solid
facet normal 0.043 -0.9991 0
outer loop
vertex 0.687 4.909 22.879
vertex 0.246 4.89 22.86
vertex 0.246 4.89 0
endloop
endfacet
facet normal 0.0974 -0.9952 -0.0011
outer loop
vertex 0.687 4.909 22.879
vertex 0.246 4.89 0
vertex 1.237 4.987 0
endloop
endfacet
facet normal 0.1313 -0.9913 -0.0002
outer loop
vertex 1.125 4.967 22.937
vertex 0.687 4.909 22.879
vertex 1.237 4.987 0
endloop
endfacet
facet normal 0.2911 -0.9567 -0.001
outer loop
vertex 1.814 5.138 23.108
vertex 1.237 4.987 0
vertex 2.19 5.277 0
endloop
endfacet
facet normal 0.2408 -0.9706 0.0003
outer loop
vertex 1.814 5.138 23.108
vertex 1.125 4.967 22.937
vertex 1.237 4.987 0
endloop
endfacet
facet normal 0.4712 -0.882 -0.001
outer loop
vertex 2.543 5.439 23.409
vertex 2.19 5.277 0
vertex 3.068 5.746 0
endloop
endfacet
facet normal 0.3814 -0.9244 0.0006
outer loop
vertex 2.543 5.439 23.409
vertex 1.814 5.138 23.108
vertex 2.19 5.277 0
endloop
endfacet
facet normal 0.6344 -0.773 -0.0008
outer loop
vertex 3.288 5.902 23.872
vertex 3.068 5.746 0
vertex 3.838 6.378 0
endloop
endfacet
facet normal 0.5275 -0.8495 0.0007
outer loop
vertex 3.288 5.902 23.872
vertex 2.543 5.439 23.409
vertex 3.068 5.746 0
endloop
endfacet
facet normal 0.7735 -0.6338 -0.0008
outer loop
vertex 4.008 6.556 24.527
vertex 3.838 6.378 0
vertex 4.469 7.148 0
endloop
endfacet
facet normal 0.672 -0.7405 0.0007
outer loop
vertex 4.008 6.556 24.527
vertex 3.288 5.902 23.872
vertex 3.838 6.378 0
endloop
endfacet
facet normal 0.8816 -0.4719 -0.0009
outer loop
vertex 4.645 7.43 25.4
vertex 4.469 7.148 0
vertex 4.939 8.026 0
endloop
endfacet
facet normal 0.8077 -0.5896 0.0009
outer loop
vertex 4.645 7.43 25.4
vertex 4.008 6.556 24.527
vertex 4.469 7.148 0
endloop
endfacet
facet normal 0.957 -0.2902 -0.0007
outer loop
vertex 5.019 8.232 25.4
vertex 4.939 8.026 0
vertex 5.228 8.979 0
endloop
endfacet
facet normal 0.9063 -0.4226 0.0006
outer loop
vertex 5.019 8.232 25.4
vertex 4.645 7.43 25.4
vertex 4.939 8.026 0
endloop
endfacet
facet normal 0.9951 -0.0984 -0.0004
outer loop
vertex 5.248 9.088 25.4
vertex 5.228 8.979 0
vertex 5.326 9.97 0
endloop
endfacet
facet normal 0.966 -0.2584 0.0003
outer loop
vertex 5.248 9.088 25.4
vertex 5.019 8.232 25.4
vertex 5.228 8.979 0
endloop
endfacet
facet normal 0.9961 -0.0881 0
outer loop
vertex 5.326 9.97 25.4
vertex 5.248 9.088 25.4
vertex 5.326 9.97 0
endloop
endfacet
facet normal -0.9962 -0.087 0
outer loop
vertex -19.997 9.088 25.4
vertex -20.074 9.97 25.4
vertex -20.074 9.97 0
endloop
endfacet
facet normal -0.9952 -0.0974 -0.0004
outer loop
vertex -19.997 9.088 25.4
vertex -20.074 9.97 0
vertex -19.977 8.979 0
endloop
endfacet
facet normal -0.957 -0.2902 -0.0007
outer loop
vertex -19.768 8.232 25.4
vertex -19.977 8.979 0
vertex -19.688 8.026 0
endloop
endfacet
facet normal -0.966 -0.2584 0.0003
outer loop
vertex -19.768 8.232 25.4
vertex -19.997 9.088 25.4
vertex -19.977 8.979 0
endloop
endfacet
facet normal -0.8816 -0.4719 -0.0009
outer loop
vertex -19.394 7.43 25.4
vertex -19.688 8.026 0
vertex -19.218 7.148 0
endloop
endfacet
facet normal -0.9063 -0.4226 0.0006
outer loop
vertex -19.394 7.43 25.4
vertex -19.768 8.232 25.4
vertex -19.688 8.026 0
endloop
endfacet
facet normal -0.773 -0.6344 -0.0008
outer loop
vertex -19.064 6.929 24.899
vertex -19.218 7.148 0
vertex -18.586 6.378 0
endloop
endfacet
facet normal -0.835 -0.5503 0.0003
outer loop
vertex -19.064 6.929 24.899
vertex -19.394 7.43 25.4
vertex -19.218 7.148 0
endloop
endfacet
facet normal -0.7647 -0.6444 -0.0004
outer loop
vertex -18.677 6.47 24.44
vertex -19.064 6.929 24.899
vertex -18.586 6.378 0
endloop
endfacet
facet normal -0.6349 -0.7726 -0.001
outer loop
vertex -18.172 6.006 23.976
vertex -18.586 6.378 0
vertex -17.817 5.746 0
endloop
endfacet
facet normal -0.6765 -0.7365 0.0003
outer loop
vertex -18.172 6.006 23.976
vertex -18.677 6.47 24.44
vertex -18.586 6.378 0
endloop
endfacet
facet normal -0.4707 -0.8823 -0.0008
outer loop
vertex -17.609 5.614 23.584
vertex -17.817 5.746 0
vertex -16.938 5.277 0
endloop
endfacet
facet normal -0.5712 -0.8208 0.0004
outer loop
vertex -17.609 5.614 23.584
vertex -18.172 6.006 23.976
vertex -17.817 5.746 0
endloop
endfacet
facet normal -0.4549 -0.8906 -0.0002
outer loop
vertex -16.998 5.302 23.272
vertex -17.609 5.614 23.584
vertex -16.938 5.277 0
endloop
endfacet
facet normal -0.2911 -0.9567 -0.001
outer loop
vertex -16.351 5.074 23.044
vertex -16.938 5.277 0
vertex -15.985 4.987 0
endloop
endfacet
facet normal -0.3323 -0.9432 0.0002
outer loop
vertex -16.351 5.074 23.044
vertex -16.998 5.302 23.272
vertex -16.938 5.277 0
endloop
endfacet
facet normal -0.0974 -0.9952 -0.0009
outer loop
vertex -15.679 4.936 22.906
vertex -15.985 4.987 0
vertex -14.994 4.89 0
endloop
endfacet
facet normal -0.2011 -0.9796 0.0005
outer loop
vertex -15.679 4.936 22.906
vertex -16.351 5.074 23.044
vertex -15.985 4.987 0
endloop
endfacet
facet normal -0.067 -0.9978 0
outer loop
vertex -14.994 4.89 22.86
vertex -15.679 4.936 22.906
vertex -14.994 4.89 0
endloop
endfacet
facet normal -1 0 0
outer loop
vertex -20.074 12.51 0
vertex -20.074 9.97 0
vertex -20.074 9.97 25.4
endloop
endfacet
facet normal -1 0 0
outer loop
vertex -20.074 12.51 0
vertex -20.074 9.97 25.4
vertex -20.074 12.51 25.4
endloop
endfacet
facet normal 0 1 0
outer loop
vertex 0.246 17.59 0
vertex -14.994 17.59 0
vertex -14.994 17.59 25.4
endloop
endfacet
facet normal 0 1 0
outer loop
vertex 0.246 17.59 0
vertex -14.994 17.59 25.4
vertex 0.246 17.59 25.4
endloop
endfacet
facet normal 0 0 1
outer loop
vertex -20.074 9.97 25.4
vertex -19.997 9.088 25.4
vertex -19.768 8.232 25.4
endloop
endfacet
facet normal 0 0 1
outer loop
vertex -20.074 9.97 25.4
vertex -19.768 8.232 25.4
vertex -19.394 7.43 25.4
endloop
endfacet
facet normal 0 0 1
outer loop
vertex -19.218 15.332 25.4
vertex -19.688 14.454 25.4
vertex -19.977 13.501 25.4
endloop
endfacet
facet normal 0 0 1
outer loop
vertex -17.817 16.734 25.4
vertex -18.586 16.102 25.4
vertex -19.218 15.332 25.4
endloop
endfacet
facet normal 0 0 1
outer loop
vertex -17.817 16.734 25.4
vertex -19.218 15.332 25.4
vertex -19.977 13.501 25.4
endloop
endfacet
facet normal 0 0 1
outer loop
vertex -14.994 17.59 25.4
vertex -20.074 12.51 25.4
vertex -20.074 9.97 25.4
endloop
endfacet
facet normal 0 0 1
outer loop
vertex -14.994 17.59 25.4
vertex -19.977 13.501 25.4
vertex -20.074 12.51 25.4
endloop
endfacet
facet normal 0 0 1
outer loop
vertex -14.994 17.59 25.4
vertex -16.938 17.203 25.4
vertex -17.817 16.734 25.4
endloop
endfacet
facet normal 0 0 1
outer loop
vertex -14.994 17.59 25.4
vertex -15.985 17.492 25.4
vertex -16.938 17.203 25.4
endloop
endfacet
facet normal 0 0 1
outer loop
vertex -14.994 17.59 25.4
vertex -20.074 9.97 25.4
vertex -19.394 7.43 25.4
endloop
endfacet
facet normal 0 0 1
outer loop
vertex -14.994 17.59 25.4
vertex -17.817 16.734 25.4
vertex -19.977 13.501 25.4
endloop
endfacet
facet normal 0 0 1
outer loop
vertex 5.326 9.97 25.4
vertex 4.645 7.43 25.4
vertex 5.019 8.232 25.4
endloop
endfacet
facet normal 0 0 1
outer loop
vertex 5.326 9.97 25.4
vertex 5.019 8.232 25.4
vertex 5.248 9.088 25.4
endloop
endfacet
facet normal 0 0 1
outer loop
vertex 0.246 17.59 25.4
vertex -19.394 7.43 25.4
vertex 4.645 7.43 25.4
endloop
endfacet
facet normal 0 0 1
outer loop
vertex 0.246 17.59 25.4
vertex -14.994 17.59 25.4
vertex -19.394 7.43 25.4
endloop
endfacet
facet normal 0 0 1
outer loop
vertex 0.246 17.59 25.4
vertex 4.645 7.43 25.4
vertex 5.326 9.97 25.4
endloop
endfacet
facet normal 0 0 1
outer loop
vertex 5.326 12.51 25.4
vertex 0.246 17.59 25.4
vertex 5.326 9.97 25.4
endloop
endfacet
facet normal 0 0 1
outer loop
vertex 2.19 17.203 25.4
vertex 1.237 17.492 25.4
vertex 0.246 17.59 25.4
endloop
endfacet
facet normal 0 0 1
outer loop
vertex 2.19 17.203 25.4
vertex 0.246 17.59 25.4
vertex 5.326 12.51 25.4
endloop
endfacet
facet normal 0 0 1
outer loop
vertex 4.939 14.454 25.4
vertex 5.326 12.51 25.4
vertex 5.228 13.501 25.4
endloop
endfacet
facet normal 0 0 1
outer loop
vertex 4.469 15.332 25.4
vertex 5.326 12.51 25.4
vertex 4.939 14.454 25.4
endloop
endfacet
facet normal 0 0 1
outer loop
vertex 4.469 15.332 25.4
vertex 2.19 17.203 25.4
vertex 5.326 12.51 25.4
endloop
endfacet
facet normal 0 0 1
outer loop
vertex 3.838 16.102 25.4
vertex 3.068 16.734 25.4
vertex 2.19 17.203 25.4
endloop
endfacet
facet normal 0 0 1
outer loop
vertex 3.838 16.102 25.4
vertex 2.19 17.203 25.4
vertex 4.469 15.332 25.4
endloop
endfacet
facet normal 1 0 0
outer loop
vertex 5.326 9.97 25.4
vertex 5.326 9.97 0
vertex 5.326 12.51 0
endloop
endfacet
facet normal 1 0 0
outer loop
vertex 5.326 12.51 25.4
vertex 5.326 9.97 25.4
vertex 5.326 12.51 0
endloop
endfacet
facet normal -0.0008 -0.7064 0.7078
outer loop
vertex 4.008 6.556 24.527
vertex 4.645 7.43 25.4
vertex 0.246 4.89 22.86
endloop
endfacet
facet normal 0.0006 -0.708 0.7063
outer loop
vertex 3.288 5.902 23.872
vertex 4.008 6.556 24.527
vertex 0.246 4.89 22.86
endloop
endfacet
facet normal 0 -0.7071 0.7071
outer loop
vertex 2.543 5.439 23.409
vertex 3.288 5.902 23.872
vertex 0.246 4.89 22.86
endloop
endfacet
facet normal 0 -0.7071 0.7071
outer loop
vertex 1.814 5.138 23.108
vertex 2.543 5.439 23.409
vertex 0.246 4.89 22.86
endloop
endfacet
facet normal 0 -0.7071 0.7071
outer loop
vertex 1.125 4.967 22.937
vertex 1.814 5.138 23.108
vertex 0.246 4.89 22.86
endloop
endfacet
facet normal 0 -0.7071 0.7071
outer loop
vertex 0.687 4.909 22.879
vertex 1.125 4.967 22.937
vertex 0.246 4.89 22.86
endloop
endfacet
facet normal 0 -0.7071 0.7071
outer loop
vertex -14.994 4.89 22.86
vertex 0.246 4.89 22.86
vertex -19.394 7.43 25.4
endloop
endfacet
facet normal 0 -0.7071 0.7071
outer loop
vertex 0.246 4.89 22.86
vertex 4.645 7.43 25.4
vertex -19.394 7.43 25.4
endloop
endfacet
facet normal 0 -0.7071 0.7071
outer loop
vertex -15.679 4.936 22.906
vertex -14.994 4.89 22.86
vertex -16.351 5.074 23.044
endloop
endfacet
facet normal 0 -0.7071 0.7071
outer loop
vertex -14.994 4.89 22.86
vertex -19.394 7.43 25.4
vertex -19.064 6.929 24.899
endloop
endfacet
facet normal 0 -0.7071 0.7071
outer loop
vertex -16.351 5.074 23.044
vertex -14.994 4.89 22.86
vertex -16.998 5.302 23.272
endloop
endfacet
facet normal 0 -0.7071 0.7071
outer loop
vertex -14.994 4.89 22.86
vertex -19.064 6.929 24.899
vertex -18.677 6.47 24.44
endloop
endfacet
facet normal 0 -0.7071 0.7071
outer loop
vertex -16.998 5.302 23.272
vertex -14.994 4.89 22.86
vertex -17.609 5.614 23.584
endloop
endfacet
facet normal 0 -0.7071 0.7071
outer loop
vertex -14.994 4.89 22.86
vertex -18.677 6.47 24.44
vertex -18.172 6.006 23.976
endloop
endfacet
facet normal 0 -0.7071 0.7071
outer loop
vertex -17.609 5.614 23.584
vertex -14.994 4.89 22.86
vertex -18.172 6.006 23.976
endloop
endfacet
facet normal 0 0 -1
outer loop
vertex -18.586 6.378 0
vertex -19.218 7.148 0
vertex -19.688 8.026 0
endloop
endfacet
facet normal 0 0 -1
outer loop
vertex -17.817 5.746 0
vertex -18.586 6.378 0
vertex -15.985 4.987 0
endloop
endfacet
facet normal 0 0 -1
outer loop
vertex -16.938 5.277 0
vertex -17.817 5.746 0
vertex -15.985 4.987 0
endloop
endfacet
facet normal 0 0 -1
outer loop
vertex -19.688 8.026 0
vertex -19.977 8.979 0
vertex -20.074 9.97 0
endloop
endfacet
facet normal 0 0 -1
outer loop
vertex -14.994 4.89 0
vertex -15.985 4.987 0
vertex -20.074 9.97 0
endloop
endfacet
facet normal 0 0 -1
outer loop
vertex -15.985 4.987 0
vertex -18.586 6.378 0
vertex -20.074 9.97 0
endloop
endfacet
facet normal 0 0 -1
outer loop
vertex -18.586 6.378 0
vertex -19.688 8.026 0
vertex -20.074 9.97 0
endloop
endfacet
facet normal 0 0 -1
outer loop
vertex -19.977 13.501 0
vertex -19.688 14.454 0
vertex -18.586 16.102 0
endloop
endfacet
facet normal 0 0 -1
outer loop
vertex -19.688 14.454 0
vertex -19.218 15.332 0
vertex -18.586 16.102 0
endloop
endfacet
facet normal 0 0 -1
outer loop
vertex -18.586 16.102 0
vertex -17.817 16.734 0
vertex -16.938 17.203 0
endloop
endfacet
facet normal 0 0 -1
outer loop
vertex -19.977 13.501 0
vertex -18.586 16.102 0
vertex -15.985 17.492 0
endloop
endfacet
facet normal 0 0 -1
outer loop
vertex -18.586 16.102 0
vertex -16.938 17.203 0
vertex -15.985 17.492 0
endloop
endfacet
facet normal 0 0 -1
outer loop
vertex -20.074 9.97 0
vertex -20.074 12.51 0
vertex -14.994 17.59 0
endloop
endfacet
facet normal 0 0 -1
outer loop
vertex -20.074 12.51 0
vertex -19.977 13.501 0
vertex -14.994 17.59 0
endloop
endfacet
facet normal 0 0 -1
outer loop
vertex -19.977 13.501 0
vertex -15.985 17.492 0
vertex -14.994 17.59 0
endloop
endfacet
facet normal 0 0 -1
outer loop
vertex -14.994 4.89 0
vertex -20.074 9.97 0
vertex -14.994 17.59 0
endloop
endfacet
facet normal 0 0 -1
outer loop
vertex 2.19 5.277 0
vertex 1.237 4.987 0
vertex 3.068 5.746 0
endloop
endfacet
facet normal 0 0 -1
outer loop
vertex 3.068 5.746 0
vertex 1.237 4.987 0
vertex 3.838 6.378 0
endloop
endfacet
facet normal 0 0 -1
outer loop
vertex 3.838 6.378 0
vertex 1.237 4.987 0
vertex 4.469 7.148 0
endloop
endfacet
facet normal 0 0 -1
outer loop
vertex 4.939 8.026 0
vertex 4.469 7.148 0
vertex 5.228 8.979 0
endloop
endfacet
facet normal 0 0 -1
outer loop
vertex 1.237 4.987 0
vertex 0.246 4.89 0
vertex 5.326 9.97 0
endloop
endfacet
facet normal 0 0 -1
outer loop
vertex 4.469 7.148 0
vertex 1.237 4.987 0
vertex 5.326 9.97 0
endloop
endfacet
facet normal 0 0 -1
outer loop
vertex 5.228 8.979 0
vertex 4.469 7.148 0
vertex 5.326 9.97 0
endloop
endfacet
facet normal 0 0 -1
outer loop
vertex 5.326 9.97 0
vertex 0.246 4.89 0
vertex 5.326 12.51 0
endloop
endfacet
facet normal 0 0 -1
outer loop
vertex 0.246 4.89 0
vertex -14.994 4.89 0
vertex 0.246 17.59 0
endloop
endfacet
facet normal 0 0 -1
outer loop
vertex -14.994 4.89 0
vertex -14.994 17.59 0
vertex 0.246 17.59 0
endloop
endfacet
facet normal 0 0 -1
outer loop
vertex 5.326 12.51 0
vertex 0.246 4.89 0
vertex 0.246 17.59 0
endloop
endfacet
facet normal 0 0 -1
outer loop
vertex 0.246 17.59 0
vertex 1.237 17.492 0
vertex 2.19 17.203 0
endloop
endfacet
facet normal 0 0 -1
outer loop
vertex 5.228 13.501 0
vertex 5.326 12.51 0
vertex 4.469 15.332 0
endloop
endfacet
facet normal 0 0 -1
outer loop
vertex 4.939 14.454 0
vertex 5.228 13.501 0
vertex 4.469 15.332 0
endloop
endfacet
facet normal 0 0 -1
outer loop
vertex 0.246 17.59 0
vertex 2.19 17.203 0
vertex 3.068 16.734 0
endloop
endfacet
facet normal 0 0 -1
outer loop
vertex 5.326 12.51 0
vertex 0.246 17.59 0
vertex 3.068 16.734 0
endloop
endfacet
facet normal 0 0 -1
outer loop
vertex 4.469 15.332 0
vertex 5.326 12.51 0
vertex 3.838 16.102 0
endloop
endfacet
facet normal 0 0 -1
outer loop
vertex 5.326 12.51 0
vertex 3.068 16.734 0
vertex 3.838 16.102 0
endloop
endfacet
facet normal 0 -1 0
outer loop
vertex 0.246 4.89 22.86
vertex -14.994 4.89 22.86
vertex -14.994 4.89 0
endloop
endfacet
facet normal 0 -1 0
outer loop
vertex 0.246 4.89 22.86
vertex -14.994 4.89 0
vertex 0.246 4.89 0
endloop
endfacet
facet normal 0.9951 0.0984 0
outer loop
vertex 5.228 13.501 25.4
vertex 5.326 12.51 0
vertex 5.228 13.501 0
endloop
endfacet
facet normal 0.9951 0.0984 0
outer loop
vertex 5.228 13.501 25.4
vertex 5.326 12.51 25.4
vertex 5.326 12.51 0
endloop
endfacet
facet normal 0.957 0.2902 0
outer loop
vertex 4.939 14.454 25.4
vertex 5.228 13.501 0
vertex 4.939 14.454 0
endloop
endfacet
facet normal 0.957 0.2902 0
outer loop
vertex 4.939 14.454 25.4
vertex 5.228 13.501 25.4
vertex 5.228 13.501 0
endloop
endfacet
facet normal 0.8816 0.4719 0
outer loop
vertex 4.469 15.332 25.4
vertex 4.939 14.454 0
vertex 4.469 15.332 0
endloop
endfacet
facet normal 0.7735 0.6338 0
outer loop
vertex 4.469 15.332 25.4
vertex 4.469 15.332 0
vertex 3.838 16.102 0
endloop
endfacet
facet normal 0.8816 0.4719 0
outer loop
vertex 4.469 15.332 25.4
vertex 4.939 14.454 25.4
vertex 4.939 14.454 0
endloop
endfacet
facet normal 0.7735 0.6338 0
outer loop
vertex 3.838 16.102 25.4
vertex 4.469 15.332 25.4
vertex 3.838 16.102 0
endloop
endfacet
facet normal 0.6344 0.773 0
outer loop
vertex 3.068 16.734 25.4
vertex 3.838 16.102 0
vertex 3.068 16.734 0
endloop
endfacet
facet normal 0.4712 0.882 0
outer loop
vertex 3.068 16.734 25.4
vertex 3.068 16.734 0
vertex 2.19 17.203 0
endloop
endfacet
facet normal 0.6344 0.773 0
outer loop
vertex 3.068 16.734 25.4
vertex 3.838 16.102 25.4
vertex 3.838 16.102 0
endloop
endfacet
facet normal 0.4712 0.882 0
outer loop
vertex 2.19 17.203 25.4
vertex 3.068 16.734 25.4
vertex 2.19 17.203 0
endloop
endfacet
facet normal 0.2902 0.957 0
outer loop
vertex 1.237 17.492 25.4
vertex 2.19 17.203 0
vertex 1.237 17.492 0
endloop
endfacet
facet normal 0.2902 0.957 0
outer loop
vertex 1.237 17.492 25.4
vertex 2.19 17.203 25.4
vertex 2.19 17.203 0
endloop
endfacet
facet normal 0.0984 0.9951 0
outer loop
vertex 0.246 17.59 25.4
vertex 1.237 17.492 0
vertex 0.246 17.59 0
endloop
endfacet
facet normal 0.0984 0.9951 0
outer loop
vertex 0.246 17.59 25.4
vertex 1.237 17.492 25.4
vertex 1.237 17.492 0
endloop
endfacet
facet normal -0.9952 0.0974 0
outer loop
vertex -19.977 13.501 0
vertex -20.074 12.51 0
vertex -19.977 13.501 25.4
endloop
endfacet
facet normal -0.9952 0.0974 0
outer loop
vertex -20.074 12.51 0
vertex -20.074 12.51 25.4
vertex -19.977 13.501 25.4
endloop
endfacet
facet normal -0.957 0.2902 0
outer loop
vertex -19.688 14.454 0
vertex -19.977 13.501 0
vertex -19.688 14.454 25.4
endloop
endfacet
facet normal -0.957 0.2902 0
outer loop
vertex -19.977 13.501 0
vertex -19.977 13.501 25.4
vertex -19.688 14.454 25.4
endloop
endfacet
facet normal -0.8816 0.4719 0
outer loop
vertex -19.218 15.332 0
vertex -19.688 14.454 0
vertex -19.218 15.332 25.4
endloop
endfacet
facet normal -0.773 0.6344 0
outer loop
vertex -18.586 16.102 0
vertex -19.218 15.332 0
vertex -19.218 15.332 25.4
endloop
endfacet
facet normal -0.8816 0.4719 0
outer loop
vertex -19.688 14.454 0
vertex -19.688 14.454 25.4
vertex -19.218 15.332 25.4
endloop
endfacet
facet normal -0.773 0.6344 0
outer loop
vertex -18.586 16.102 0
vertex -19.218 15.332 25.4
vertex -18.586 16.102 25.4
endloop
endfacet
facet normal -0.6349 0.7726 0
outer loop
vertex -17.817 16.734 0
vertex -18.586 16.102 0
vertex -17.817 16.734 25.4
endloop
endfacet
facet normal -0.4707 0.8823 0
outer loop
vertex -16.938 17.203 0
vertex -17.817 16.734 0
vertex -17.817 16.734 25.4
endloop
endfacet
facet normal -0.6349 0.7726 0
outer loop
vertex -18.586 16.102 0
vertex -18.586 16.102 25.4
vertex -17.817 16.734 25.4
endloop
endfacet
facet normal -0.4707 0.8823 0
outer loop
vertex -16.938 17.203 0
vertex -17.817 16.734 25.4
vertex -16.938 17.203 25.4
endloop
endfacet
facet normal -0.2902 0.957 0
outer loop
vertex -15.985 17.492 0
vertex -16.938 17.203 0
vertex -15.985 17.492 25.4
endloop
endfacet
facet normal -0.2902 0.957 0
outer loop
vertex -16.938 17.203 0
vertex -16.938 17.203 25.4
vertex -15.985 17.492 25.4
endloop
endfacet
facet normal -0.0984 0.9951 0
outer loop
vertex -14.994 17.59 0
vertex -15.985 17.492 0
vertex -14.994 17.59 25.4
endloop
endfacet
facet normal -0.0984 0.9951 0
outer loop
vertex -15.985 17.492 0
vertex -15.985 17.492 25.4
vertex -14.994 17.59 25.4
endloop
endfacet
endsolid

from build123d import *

# Parameters (mm, degrees)
F0_W        = 25.4
F0_H        = 12.7
F1_DEPTH    = 25.4
F2_R        = 5.08
F3_T1_DEPTH = 28.3041495789


# Not quite as in the source:
# - a fillet or chamfer that OpenCascade refuses, or shapes differently, is made with other operations: its cross-section is extruded or revolved along the edge and cut away or added


with BuildPart() as f1:
    # F0 (on Top) → F1 (new body)
    with BuildSketch(Plane.XY):
        with Locations((-7.3743816465, 11.2398102205)):
            Rectangle(F0_W, F0_H)
    extrude(amount=F1_DEPTH)

    # F2
    f2_edges = [f1.edges().sort_by_distance(p)[0] for p in [
        (5.325618, 4.88981, 12.7),
        (5.325618, 17.58981, 12.7),
        (-20.074382, 17.58981, 12.7),
        (-20.074382, 4.88981, 12.7),
    ]]
    fillet(f2_edges, radius=F2_R)

    # F3: chamfer of 2.54 on 1 edges, made by hand

    # F3_s2 → F3_t1 (cut)
    with BuildSketch(Plane.YZ.offset(-21.5264564359)):
        Polygon((7.4298102205, 25.4), (4.8898102205, 22.86), (4.8898102205, 25.4), align=None)
    extrude(amount=F3_T1_DEPTH, mode=Mode.SUBTRACT)


solid = f1.part
